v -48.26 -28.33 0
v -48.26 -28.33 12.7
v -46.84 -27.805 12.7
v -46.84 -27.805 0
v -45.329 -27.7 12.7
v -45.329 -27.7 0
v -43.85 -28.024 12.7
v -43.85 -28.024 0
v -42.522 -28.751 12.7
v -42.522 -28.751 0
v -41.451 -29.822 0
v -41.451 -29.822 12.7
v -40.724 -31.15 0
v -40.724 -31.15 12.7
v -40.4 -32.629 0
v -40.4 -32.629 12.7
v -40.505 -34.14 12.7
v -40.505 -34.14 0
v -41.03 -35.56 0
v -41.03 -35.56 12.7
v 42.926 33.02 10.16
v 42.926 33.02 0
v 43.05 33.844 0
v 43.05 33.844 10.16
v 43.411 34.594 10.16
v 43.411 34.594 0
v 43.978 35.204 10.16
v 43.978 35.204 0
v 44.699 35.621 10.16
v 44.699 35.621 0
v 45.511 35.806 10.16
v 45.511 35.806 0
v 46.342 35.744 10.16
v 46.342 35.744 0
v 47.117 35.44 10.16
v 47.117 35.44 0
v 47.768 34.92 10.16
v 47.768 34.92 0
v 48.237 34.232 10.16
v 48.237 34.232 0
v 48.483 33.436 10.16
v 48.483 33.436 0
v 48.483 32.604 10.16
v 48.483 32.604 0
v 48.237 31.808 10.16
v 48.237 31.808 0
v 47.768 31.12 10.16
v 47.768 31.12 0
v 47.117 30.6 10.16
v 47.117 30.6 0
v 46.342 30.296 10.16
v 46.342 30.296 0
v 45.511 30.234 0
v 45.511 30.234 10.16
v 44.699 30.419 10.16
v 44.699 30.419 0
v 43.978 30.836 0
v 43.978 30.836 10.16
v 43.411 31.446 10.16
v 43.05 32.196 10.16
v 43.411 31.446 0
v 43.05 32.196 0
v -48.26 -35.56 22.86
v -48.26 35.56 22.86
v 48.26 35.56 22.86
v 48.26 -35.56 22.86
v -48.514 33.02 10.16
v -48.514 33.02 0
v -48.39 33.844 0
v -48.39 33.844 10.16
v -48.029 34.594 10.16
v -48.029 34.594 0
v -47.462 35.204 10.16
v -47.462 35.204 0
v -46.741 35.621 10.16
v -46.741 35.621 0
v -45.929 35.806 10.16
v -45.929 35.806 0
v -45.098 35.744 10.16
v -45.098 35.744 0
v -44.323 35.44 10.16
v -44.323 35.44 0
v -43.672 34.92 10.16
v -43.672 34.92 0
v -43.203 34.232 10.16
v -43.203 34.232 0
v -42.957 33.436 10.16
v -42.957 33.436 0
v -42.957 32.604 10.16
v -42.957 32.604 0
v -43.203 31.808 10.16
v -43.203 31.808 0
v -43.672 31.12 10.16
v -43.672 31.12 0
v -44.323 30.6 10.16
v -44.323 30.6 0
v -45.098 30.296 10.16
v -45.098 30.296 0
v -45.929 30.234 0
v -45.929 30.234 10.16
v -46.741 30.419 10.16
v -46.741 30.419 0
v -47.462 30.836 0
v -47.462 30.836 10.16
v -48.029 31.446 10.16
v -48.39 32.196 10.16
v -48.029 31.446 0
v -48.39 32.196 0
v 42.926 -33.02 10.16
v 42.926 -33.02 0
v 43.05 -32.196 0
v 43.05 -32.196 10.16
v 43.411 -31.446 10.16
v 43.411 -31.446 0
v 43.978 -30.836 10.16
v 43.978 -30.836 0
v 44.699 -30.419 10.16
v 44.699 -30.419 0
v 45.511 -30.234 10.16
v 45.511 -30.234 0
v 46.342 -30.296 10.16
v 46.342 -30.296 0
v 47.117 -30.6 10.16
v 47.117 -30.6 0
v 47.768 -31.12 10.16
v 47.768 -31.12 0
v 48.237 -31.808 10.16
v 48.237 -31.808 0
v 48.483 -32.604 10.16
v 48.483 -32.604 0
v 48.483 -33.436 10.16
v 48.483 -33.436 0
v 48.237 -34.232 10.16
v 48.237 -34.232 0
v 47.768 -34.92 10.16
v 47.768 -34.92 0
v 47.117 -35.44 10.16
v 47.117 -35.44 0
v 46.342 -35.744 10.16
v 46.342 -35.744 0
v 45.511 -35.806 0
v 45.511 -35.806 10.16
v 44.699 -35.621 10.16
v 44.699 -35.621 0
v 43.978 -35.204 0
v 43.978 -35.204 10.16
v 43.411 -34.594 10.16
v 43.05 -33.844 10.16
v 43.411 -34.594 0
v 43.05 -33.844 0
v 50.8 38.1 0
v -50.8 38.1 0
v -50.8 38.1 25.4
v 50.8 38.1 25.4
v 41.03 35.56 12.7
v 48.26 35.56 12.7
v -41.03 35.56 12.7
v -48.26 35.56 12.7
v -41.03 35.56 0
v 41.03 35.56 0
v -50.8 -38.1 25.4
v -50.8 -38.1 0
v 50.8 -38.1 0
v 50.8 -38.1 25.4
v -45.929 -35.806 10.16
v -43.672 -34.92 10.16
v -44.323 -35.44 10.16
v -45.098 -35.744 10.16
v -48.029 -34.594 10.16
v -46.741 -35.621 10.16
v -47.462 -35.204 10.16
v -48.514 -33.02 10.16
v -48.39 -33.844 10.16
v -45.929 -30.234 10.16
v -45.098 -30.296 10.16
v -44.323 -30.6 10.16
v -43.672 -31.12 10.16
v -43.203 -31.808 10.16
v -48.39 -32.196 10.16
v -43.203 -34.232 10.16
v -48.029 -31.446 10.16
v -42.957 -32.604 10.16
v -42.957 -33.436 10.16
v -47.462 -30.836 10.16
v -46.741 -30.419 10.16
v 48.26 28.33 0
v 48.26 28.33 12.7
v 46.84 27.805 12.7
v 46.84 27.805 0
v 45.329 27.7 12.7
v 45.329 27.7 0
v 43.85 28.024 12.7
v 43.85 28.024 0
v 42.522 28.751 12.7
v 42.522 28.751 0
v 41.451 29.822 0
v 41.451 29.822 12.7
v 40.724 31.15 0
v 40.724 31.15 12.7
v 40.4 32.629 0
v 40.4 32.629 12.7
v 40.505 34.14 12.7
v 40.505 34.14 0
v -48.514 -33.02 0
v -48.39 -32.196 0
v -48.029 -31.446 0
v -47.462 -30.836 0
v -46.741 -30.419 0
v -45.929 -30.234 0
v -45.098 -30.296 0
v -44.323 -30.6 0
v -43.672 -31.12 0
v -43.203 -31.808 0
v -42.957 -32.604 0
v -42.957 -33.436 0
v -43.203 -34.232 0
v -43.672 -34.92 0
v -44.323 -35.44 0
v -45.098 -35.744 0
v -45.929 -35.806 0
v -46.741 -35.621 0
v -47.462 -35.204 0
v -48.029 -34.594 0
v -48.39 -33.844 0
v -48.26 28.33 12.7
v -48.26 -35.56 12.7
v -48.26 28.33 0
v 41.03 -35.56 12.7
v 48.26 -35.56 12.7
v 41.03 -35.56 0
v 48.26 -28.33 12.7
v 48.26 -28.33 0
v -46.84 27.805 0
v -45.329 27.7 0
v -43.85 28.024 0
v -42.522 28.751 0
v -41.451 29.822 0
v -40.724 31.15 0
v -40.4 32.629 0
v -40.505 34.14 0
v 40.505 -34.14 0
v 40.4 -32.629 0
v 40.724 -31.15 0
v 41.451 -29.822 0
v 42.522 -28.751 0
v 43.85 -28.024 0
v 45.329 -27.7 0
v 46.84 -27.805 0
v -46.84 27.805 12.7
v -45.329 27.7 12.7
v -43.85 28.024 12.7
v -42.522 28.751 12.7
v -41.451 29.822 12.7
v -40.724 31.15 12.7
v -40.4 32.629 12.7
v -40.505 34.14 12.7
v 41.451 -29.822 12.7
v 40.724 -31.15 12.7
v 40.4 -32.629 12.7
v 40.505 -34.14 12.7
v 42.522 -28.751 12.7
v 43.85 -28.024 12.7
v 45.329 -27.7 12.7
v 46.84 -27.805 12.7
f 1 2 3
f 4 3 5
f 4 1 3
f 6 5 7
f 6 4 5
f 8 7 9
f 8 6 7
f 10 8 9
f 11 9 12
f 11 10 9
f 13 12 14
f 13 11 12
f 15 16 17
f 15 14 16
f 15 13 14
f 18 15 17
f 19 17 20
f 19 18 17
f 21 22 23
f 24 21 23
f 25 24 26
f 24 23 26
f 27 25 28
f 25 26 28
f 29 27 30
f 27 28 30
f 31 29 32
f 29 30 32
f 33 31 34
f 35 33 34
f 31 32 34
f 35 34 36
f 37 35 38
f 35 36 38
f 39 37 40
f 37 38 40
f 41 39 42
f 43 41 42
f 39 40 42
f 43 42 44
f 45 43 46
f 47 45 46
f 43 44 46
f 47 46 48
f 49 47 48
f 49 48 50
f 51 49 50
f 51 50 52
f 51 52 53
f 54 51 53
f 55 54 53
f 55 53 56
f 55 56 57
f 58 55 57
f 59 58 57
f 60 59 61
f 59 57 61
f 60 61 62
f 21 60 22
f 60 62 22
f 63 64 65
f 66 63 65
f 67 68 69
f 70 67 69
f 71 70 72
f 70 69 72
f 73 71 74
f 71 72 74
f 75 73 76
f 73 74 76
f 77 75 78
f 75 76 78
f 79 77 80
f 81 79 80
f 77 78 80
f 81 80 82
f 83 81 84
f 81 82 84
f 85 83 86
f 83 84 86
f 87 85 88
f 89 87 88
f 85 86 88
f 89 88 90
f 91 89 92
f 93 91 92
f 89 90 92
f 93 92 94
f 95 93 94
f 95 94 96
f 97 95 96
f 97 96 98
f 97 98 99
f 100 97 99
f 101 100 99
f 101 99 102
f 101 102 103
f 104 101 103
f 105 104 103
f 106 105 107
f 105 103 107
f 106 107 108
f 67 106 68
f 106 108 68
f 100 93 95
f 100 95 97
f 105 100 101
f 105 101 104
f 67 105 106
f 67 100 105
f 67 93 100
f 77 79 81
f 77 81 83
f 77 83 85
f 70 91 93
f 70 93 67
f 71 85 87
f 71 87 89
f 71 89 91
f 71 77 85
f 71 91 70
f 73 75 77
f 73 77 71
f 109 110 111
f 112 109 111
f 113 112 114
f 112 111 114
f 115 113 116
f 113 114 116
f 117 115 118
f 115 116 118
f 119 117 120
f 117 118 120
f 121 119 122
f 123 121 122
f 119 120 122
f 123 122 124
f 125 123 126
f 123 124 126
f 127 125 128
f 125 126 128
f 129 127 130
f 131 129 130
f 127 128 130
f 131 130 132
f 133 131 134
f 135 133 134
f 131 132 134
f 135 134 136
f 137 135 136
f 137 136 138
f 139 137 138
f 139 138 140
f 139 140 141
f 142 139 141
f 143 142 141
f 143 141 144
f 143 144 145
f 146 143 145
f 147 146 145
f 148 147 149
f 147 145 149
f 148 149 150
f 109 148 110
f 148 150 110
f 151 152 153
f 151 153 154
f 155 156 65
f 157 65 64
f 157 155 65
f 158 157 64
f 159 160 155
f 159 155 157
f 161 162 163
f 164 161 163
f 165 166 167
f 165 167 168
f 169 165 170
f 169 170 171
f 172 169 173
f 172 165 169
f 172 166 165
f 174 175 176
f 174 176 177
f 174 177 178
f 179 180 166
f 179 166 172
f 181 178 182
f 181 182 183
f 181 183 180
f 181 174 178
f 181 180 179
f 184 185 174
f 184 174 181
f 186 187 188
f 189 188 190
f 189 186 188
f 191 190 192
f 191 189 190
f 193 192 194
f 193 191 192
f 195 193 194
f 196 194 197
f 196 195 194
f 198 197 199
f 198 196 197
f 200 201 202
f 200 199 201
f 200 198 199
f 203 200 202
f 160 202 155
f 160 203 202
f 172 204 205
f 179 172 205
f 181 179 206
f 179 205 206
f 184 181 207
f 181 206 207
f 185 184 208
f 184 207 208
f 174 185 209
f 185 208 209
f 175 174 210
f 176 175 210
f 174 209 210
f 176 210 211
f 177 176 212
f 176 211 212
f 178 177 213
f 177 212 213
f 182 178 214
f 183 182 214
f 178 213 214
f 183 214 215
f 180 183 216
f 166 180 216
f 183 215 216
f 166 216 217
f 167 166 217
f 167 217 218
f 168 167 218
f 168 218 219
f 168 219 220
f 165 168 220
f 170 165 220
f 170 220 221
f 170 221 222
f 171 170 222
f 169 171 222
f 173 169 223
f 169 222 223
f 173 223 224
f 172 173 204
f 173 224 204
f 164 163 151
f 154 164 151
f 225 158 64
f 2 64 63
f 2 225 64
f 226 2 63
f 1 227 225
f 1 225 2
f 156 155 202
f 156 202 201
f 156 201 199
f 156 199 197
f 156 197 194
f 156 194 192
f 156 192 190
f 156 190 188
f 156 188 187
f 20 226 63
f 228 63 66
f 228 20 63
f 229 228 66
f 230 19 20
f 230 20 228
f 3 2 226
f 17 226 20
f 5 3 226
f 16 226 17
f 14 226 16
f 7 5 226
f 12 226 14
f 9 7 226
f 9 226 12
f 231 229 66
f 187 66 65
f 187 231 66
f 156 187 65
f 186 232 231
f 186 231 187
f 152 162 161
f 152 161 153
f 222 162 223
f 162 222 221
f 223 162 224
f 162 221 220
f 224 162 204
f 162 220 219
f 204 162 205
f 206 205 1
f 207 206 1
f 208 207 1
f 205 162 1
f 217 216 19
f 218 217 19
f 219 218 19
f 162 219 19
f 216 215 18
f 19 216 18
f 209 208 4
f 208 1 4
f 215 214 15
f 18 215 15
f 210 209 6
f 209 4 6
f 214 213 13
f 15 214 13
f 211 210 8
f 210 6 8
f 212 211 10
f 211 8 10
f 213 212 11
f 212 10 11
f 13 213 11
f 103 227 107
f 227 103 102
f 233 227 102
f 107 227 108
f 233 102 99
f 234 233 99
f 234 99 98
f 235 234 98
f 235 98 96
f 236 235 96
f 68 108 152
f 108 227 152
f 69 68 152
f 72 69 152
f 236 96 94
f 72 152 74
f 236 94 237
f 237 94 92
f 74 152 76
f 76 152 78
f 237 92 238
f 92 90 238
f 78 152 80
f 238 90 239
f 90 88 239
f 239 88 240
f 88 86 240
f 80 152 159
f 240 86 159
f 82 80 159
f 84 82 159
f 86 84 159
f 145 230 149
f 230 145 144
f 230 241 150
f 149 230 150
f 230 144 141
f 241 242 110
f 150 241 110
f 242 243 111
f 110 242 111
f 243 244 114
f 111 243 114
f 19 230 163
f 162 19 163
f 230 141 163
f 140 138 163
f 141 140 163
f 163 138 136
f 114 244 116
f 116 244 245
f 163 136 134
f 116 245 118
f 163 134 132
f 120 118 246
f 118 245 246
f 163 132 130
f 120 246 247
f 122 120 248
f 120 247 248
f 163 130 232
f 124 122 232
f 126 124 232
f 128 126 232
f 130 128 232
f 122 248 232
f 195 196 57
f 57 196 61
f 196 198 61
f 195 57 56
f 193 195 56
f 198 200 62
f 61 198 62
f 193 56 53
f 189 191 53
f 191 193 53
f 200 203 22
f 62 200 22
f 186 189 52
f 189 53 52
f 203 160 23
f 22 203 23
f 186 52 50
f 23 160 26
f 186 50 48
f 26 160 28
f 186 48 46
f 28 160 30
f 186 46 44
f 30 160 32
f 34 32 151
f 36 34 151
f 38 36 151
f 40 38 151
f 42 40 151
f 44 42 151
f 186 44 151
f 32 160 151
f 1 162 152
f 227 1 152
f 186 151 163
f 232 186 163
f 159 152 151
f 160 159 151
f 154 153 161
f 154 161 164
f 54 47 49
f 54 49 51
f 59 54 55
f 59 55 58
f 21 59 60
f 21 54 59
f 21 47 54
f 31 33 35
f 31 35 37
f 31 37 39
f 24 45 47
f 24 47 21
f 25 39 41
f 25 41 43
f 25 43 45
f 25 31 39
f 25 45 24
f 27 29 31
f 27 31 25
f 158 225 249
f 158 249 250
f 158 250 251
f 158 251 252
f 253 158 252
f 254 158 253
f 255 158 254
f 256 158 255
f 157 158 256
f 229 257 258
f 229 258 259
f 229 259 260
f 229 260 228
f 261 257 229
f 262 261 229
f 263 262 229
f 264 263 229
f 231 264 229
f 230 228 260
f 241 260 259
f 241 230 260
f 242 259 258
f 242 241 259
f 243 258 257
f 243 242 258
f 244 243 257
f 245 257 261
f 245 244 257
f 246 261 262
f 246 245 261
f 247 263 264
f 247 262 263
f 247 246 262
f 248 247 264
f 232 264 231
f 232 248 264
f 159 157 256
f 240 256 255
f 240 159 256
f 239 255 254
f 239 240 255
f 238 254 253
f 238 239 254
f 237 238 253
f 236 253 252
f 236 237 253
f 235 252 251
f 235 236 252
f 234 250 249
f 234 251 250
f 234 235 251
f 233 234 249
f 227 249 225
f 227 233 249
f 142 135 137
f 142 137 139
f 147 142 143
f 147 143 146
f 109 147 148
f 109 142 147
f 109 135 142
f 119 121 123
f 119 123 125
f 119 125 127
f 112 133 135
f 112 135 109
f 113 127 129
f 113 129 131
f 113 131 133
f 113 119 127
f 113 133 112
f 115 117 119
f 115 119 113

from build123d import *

# Parameters (mm, degrees)
SKETCH1_W           = 101.6
SKETCH1_H           = 76.2
BOSS_EXTRUDE1_DEPTH = 25.4
SKETCH2_R           = 2.794
CUT_EXTRUDE1_DEPTH  = 10.16
SHELL1_DEPTH        = 22.86
SHELL1_START        = 12.7
SHELL1_2_DEPTH      = 10.16


# Read off the part's stored shape, not the designer's step: Shell1
with BuildPart() as part:
    # Sketch1 → Boss-Extrude1 (new body)
    with BuildSketch(Plane.XY):
        Rectangle(SKETCH1_W, SKETCH1_H)
    extrude(amount=BOSS_EXTRUDE1_DEPTH)

    # Sketch2 → Cut-Extrude1 (cut)
    with BuildSketch(Plane(origin=(0, 0, 0), x_dir=(-1, 0, 0), z_dir=(0, 0, -1))):
        with Locations((45.72, -33.02)):
            Circle(SKETCH2_R)
        with Locations((-45.72, -33.02)):
            Circle(SKETCH2_R)
        with Locations((-45.72, 33.02)):
            Circle(SKETCH2_R)
        with Locations((45.72, 33.02)):
            Circle(SKETCH2_R)
    extrude(amount=-CUT_EXTRUDE1_DEPTH, mode=Mode.SUBTRACT)

    # Shell1 outline → Shell1 (cut)
    with BuildSketch(Plane.XY):
        with BuildLine():
            Line((41.029588931, 35.56), (-41.029588931, 35.56))
            ThreePointArc((-41.029588931, 35.56), (-41.948292429, 29.248292429), (-48.26, 28.329588931))
            Line((-48.26, 28.329588931), (-48.26, -28.329588931))
            ThreePointArc((-48.26, -28.329588931), (-41.948292429, -29.248292429), (-41.029588931, -35.56))
            Line((-41.029588931, -35.56), (41.029588931, -35.56))
            ThreePointArc((41.029588931, -35.56), (41.948292429, -29.248292429), (48.26, -28.329588931))
            Line((48.26, -28.329588931), (48.26, 28.329588931))
            ThreePointArc((48.26, 28.329588931), (41.948292429, 29.248292429), (41.029588931, 35.56))
        make_face()
    extrude(amount=SHELL1_DEPTH, mode=Mode.SUBTRACT)

    # Shell1 2 outline → Shell1 2 (cut)
    with BuildSketch(Plane.XY.offset(SHELL1_START)):
        with BuildLine():
            Line((-41.029588931, 35.56), (-48.26, 35.56))
            Line((-48.26, 35.56), (-48.26, 28.329588931))
            ThreePointArc((-48.26, 28.329588931), (-41.948292429, 29.248292429), (-41.029588931, 35.56))
        make_face()
        with BuildLine():
            Line((48.26, 35.56), (41.029588931, 35.56))
            ThreePointArc((41.029588931, 35.56), (41.948292429, 29.248292429), (48.26, 28.329588931))
            Line((48.26, 28.329588931), (48.26, 35.56))
        make_face()
        with BuildLine():
            ThreePointArc((-41.029588931, -35.56), (-41.948292429, -29.248292429), (-48.26, -28.329588931))
            Line((-48.26, -28.329588931), (-48.26, -35.56))
            Line((-48.26, -35.56), (-41.029588931, -35.56))
        make_face()
        with BuildLine():
            Line((48.26, -35.56), (48.26, -28.329588931))
            ThreePointArc((48.26, -28.329588931), (41.948292429, -29.248292429), (41.029588931, -35.56))
            Line((41.029588931, -35.56), (48.26, -35.56))
        make_face()
    extrude(amount=SHELL1_2_DEPTH, mode=Mode.SUBTRACT)


solid = part.part
